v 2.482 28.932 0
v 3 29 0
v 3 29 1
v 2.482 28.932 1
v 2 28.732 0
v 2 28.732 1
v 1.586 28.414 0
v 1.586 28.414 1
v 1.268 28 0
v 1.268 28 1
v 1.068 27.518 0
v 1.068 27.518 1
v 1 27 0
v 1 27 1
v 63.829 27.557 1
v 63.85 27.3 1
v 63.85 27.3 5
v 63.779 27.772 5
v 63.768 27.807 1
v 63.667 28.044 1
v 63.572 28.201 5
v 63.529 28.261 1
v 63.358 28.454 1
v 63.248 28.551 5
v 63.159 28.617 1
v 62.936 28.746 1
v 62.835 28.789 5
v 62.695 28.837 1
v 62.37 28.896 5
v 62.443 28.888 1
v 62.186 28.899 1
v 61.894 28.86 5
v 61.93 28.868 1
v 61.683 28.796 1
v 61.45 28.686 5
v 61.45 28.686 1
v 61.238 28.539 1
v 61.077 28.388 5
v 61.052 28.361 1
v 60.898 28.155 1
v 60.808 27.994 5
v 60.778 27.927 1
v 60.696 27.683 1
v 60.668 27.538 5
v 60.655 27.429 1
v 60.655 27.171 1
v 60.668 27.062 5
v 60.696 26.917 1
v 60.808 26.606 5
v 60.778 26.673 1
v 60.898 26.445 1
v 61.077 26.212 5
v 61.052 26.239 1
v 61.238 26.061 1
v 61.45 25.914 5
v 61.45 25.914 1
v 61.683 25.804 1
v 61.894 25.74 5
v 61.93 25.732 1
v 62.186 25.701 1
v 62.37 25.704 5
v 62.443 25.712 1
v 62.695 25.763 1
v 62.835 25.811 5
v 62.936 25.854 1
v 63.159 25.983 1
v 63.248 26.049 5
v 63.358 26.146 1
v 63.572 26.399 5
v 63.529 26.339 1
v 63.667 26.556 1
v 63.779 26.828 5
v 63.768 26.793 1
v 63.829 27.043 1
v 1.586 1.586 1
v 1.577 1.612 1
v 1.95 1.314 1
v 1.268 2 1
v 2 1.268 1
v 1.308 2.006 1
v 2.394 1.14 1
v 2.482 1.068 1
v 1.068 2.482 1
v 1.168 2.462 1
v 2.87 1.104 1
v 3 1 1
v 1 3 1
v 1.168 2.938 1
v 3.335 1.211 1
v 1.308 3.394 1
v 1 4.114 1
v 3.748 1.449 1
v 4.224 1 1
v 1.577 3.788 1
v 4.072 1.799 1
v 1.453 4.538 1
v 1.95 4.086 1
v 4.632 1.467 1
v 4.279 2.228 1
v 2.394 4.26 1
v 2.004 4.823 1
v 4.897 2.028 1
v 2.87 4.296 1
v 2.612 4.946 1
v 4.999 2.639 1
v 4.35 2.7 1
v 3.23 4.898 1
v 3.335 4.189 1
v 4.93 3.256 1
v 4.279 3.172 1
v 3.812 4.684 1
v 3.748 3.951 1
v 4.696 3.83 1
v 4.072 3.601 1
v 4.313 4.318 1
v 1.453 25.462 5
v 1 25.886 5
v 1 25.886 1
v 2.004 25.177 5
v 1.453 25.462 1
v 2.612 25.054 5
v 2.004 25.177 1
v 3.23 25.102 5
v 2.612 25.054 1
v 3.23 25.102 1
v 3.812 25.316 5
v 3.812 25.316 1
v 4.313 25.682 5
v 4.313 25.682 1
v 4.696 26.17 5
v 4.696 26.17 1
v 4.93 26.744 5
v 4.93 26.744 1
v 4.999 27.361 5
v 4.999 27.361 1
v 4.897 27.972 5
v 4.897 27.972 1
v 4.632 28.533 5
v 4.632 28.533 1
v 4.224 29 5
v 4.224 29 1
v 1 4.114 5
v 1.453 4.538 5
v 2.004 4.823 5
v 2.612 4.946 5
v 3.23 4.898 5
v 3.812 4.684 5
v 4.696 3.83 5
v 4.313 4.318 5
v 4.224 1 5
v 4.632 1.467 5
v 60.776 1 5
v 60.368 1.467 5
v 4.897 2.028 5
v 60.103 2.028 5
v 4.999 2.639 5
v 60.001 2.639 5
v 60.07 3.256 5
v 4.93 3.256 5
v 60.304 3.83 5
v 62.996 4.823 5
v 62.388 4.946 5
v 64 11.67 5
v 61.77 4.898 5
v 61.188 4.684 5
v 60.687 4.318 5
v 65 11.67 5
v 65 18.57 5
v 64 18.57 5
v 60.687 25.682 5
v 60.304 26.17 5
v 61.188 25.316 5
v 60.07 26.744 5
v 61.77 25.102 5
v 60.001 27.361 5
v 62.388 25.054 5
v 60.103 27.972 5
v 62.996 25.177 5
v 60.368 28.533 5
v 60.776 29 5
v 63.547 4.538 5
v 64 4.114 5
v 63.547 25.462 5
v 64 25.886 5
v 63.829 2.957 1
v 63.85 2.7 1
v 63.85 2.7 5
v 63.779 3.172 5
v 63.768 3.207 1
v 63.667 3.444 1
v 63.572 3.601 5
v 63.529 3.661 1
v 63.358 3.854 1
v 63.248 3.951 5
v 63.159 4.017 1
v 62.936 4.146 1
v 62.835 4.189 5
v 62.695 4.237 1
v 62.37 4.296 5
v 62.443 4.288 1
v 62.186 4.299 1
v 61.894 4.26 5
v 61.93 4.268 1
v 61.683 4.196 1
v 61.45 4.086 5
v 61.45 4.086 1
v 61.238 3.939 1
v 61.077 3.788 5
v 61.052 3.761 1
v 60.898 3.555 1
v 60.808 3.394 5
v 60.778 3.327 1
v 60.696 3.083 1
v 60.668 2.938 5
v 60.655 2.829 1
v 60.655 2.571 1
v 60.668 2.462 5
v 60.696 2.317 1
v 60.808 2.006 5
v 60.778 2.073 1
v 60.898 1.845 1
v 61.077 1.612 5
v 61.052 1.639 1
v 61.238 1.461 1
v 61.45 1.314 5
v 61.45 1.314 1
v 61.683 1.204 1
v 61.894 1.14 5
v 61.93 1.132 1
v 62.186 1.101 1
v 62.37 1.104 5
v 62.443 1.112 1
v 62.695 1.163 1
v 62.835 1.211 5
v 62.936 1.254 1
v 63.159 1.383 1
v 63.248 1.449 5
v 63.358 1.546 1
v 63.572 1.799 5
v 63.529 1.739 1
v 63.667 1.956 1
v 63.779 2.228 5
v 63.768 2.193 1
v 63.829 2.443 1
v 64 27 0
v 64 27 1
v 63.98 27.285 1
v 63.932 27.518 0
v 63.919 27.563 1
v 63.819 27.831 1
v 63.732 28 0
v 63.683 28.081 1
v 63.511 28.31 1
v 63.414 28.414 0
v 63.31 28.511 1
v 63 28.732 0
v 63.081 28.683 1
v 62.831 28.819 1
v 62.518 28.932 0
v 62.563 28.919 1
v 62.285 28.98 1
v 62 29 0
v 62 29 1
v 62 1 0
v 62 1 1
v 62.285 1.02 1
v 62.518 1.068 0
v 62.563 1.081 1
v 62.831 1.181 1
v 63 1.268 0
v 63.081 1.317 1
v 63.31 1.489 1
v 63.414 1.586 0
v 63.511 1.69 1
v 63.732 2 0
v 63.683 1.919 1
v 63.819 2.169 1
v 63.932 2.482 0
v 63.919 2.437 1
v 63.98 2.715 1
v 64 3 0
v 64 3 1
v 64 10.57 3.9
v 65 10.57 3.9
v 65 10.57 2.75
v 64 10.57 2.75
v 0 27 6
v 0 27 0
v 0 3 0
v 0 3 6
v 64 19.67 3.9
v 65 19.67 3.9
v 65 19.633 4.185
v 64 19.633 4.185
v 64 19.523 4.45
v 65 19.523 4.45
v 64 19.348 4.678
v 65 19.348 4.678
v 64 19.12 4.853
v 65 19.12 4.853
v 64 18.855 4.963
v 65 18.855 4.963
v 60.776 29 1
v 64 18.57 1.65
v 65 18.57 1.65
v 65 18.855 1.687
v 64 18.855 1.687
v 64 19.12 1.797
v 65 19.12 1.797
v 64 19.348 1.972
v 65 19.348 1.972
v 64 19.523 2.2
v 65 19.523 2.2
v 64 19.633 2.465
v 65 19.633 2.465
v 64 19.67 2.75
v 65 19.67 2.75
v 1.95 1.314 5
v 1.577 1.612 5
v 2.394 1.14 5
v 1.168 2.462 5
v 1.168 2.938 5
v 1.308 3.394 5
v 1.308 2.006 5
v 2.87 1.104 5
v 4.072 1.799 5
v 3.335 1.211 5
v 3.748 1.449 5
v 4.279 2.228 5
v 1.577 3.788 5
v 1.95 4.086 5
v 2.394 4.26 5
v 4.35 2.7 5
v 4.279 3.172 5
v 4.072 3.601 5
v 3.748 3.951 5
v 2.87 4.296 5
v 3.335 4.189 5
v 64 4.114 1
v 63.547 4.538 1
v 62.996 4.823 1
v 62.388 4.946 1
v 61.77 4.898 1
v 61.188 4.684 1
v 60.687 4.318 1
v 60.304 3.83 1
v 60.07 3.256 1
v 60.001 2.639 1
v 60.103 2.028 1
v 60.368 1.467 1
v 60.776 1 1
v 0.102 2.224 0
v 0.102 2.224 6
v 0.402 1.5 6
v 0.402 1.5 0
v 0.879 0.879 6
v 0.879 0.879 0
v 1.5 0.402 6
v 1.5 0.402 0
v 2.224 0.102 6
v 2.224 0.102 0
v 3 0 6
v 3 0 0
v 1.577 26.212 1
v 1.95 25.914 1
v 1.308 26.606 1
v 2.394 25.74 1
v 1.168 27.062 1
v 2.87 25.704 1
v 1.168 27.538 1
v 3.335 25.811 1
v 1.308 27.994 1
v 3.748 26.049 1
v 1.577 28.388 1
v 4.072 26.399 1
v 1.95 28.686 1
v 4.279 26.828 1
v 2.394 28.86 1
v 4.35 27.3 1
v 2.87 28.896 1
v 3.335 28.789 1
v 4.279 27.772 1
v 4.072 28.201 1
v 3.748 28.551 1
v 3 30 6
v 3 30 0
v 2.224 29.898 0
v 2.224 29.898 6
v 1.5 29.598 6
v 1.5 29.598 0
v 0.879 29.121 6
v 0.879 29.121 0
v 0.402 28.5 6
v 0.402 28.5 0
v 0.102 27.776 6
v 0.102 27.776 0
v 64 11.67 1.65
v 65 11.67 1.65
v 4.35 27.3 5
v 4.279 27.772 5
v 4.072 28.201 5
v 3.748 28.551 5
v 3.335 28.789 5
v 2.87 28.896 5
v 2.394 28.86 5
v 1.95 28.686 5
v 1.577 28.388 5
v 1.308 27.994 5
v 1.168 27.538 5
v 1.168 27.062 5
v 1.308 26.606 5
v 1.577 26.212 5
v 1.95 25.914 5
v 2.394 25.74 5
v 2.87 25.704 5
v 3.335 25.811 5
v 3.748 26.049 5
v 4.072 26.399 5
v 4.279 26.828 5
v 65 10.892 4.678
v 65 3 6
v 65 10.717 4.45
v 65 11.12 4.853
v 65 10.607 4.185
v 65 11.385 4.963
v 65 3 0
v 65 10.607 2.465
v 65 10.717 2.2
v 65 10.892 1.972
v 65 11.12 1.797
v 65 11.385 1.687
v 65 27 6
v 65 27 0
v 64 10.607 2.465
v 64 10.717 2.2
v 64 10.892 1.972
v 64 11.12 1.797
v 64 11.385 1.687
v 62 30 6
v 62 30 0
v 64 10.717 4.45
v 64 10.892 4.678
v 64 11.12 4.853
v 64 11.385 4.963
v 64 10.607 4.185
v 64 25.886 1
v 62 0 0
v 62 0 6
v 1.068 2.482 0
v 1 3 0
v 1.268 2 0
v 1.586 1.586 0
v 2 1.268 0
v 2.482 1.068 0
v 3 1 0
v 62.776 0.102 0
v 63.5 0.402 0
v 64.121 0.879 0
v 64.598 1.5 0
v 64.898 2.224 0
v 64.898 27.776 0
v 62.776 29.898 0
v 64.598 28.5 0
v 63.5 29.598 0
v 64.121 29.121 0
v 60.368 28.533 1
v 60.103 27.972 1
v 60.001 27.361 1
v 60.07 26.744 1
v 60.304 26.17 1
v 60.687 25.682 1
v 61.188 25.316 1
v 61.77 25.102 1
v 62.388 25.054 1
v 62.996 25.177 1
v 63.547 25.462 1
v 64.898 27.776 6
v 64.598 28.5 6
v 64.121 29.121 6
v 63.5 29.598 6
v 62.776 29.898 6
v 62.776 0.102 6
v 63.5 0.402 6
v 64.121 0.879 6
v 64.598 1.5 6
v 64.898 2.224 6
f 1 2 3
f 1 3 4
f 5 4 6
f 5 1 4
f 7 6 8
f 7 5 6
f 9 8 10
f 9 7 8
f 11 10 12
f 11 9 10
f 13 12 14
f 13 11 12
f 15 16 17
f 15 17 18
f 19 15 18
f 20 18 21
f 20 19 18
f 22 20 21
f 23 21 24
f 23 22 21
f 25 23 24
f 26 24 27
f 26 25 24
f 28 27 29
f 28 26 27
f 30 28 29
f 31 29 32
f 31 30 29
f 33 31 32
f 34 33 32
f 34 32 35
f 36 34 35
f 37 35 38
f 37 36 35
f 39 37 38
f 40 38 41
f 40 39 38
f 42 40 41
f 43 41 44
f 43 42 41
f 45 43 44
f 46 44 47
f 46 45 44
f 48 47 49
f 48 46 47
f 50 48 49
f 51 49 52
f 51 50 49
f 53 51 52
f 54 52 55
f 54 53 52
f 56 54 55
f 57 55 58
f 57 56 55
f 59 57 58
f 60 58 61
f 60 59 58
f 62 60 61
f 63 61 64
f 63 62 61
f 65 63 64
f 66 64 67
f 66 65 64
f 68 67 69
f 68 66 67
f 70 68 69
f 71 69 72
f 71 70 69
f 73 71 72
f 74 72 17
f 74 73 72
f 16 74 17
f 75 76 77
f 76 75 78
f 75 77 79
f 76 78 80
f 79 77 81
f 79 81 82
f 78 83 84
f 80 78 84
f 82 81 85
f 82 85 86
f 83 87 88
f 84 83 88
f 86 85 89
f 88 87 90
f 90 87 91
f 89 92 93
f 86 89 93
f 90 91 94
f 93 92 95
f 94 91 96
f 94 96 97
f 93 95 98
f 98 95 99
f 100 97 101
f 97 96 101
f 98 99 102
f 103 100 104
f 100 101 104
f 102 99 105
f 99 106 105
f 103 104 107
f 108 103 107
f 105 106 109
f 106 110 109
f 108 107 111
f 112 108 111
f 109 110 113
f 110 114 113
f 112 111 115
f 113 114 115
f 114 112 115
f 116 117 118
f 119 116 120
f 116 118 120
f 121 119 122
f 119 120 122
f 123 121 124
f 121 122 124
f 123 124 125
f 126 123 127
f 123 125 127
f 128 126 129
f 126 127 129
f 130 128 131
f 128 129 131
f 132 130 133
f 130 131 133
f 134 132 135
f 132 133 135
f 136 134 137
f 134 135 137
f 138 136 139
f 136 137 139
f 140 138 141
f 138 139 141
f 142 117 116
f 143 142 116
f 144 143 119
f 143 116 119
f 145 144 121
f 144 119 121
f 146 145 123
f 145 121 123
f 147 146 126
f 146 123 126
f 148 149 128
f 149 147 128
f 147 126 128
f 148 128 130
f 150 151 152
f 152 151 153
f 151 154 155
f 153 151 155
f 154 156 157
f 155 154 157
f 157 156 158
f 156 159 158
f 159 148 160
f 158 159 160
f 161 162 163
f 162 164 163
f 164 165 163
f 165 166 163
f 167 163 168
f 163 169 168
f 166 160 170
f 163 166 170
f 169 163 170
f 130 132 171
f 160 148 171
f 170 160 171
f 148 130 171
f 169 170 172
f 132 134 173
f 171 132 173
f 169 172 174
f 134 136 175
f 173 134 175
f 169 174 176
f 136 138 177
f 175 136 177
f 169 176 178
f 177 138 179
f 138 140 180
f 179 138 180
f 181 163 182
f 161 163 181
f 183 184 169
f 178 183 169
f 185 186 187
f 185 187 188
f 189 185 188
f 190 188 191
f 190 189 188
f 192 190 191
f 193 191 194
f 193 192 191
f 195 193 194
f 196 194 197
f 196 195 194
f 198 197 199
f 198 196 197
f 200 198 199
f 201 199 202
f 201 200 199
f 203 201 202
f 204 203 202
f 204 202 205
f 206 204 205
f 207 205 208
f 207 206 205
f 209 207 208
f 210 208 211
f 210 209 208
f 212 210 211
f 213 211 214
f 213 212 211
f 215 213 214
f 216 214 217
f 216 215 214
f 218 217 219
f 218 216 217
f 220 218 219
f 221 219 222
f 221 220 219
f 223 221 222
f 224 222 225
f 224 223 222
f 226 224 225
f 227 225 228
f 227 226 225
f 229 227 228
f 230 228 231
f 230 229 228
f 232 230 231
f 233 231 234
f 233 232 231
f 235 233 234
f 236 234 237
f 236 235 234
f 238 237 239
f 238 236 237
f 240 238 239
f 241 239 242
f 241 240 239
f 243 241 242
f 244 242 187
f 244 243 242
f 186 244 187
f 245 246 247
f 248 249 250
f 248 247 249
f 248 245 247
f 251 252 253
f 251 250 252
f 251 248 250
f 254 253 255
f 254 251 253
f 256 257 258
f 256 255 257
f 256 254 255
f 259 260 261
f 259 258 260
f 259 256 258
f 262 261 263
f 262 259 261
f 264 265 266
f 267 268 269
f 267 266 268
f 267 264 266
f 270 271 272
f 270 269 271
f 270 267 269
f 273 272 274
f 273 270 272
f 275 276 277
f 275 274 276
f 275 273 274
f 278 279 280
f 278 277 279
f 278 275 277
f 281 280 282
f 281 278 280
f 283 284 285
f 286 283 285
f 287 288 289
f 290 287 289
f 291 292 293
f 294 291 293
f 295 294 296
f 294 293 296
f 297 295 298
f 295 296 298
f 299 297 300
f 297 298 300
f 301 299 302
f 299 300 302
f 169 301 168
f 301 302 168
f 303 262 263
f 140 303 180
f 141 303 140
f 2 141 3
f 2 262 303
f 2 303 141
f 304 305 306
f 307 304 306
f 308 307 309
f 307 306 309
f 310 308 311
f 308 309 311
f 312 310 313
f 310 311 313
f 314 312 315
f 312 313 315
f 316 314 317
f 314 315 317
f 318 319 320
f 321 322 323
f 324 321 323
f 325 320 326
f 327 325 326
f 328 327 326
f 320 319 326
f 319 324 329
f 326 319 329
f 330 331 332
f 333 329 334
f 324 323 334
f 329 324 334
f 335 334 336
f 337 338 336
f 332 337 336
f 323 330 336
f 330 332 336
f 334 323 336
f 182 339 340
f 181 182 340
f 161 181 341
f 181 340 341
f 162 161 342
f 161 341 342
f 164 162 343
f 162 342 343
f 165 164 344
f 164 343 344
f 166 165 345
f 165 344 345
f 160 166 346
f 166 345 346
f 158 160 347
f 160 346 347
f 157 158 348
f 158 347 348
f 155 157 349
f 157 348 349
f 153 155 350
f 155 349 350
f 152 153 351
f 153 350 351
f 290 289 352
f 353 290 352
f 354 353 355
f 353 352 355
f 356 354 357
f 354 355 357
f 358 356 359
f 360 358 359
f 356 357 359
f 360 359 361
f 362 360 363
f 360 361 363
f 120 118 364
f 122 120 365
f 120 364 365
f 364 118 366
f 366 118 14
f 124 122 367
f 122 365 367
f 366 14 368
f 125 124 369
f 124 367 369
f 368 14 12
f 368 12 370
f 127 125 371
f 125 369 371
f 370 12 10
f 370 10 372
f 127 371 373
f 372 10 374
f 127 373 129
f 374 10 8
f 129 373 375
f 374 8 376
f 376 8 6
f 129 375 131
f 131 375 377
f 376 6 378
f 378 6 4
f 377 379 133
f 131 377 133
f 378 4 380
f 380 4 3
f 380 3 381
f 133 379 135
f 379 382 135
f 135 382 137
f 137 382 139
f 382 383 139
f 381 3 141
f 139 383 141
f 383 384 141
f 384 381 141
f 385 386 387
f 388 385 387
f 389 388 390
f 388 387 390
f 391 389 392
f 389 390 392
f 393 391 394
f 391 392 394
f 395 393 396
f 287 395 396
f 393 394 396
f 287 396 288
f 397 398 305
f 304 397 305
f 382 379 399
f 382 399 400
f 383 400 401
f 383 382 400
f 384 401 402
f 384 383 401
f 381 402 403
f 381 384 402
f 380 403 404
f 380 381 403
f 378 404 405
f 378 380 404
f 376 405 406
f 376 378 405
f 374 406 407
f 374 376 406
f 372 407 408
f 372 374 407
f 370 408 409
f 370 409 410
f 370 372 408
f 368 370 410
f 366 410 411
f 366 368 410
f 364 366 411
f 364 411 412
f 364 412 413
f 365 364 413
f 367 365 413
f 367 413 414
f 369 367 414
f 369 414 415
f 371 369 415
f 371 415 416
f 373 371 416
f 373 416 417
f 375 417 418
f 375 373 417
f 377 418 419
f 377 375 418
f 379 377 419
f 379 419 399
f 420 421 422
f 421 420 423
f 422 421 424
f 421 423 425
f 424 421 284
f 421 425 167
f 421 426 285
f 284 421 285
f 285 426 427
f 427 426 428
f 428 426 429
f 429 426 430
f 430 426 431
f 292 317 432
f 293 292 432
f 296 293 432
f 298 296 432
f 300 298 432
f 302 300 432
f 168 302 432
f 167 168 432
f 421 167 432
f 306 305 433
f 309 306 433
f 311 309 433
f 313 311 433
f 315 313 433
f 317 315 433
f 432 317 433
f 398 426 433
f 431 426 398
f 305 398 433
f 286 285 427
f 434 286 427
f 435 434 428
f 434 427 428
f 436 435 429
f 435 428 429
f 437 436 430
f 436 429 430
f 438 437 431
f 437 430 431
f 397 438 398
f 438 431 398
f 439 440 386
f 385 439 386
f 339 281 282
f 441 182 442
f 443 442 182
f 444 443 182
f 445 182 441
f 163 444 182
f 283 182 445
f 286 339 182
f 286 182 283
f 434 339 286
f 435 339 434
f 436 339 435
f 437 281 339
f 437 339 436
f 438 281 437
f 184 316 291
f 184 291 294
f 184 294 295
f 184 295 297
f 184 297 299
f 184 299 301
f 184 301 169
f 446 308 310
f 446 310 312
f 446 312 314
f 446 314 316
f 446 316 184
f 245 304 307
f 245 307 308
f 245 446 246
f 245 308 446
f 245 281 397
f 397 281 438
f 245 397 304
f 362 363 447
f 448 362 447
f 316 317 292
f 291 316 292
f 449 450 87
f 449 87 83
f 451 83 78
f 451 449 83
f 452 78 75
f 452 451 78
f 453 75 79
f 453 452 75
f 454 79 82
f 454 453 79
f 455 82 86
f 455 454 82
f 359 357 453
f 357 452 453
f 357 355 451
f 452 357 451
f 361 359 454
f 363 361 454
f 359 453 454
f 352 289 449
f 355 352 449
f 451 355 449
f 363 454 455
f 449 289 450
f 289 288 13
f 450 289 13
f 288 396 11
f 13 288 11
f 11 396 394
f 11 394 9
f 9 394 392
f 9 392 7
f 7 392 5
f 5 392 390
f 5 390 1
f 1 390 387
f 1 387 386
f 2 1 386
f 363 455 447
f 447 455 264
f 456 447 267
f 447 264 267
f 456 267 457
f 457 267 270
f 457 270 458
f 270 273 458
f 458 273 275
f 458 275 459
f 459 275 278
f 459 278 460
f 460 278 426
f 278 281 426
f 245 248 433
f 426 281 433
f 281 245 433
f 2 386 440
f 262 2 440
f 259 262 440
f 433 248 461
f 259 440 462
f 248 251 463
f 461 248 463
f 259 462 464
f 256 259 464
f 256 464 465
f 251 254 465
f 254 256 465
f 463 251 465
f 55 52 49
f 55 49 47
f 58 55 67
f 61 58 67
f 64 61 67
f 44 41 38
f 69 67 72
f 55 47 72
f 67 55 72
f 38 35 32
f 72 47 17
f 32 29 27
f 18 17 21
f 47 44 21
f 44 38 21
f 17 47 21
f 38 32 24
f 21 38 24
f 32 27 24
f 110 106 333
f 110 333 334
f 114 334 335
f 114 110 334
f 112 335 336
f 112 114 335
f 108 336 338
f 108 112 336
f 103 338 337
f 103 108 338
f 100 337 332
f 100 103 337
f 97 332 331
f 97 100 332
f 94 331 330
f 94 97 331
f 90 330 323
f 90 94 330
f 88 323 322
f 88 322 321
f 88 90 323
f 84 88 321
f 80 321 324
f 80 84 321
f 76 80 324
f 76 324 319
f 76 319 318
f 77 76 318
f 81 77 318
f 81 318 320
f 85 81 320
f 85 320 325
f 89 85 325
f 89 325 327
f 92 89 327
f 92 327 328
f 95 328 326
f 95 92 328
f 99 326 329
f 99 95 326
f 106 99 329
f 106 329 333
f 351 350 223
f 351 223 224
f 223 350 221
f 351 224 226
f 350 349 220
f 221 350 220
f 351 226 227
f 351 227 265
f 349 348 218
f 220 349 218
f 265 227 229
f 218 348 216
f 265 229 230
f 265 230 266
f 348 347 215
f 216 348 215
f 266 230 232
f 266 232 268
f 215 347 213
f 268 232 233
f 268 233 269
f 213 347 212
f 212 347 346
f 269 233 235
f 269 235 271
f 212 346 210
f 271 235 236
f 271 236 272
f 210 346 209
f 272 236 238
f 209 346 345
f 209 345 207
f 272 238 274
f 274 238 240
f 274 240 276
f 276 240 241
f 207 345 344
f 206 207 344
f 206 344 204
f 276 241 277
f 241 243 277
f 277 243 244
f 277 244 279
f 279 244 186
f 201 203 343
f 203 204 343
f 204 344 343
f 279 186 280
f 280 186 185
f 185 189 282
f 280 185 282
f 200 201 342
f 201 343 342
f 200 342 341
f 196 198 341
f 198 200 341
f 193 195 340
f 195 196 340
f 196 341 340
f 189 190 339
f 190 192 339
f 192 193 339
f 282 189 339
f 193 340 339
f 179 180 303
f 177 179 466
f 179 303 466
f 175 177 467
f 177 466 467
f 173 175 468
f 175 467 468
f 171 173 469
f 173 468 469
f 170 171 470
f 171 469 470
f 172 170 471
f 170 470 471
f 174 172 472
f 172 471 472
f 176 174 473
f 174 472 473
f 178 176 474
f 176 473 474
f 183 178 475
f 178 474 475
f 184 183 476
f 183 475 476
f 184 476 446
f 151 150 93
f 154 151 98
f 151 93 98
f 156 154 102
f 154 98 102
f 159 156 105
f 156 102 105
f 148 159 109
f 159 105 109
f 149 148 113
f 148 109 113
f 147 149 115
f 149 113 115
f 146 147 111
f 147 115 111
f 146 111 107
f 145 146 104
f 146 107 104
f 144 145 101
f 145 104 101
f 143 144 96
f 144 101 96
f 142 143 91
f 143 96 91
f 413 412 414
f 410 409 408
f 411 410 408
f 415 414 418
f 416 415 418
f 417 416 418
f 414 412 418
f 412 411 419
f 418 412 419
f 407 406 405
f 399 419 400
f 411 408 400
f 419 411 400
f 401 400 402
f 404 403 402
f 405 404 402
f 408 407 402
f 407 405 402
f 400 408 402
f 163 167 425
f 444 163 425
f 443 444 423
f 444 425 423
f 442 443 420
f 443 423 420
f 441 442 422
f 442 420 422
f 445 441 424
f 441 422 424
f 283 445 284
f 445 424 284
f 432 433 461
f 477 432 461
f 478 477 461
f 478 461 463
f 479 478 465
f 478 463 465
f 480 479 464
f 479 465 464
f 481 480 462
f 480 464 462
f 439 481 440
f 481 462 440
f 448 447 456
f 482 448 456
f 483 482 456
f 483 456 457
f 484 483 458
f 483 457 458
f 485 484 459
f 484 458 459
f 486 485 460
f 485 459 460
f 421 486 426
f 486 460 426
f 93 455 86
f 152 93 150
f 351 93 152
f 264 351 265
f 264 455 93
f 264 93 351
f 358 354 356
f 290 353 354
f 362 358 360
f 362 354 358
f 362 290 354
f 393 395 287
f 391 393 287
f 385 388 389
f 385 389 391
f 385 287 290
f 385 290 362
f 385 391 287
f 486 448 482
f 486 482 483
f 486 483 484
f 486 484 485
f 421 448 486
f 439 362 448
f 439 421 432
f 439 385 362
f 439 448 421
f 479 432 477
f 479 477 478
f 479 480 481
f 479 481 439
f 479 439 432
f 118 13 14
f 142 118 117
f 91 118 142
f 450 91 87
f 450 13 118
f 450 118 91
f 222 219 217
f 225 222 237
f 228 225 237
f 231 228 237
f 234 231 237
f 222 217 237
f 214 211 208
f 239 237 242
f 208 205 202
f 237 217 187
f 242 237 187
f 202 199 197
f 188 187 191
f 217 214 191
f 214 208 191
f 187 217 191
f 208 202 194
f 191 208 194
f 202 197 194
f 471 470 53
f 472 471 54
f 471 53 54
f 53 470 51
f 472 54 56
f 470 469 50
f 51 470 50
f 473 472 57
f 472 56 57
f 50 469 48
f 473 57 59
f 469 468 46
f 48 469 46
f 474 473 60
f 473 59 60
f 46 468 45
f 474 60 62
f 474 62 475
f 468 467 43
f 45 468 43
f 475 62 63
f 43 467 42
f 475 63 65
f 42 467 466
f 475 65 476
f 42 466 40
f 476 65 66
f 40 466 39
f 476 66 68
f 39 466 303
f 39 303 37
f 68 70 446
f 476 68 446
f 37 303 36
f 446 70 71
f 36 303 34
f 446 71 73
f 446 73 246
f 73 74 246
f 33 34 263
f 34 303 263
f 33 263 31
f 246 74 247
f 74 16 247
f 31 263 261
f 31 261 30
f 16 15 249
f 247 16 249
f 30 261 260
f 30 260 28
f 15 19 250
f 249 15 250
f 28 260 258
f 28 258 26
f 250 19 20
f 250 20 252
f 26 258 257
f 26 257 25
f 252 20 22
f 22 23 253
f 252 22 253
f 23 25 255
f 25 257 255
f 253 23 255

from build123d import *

# Parameters (mm, degrees)
PAD_DEPTH       = 6
POCKET_DEPTH    = 5
SKETCH002_R     = 2.25
SKETCH002_R_2   = 1.6
PAD001_DEPTH    = 4
POCKET001_DEPTH = 10


with BuildPart() as part:
    # Sketch → Pad (new body)
    with BuildSketch(Plane.XY):
        with BuildLine():
            Line((3, 0), (62, 0))
            ThreePointArc((62, 0), (64.12132, 0.87868), (65, 3))
            Line((65, 3), (65, 27))
            ThreePointArc((65, 27), (64.12132, 29.12132), (62, 30))
            Line((62, 30), (3, 30))
            ThreePointArc((3, 30), (0.87868, 29.12132), (0, 27))
            Line((0, 27), (0, 3))
            ThreePointArc((0, 3), (0.87868, 0.87868), (3, 0))
        make_face()
    extrude(amount=PAD_DEPTH)

    # Sketch001 → Pocket (cut)
    with BuildSketch(Plane.XY):
        with BuildLine():
            Line((1, 27), (1, 3))
            ThreePointArc((1, 3), (1.585786, 1.585786), (3, 1))
            Line((3, 1), (62, 1))
            ThreePointArc((62, 1), (63.414214, 1.585786), (64, 3))
            Line((64, 3), (64, 27))
            ThreePointArc((64, 27), (63.414214, 28.414214), (62, 29))
            Line((62, 29), (3, 29))
            ThreePointArc((3, 29), (1.585786, 28.414214), (1, 27))
        make_face()
    extrude(amount=POCKET_DEPTH, mode=Mode.SUBTRACT)

    # Sketch002 → Pad001 (join)
    with BuildSketch(Plane.XY.offset(1)):
        with Locations((62.25, 27.3)):
            Circle(SKETCH002_R)
        with Locations((62.25, 27.3)):
            Circle(SKETCH002_R_2, mode=Mode.SUBTRACT)
        with Locations((2.75, 27.3)):
            Circle(SKETCH002_R)
        with Locations((2.75, 27.3)):
            Circle(SKETCH002_R_2, mode=Mode.SUBTRACT)
        with Locations((2.75, 2.7)):
            Circle(SKETCH002_R)
        with Locations((2.75, 2.7)):
            Circle(SKETCH002_R_2, mode=Mode.SUBTRACT)
        with Locations((62.25, 2.7)):
            Circle(SKETCH002_R)
        with Locations((62.25, 2.7)):
            Circle(SKETCH002_R_2, mode=Mode.SUBTRACT)
    extrude(amount=PAD001_DEPTH)

    # Sketch003 → Pocket001 (cut)
    with BuildSketch(Plane.YZ.offset(70)):
        with BuildLine():
            Line((10.57, 3.9), (10.57, 2.75))
            ThreePointArc((10.57, 2.75), (10.892183, 1.972183), (11.67, 1.65))
            Line((11.67, 1.65), (18.57, 1.65))
            ThreePointArc((18.57, 1.65), (19.347817, 1.972183), (19.67, 2.75))
            Line((19.67, 2.75), (19.67, 3.9))
            ThreePointArc((19.67, 3.9), (19.347817, 4.677817), (18.57, 5))
            Line((18.57, 5), (11.67, 5))
            ThreePointArc((11.67, 5), (10.892183, 4.677817), (10.57, 3.9))
        make_face()
    extrude(amount=-POCKET001_DEPTH, mode=Mode.SUBTRACT)


solid = part.part
